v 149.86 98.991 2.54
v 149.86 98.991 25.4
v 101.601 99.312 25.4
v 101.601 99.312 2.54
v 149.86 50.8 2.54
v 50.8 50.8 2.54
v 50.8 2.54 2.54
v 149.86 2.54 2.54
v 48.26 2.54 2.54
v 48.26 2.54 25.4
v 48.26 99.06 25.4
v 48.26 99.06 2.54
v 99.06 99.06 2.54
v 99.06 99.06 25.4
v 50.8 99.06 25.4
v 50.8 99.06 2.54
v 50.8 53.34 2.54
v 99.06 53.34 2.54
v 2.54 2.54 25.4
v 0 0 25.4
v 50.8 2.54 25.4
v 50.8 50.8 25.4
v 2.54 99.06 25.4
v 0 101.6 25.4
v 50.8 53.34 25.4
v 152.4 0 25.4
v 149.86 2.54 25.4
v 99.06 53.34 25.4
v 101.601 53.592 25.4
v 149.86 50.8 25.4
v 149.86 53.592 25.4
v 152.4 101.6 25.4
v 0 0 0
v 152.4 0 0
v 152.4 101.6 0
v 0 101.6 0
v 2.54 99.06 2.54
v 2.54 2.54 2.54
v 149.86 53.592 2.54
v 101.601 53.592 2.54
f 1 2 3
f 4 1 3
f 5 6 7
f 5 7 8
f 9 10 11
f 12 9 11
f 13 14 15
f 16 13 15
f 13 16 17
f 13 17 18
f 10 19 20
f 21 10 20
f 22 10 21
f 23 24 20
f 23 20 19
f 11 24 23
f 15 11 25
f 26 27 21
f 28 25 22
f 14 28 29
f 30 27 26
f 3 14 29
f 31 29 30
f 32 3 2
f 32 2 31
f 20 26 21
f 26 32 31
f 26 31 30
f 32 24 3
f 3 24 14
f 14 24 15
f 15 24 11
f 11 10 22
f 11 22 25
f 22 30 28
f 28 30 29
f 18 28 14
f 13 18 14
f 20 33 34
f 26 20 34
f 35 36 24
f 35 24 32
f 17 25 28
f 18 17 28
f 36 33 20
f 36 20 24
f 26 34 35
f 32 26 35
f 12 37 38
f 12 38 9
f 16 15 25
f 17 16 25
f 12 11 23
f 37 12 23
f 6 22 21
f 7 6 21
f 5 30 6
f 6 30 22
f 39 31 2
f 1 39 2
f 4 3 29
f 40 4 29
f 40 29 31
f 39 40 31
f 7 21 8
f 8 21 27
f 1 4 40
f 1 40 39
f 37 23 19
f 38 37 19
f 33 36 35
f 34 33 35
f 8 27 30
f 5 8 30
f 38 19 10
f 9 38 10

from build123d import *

# Parameters (mm, degrees)
F0_W     = 152.4
F0_H     = 101.6
F1_DEPTH = 25.4
F3_DEPTH = 22.86
F5_DEPTH = 22.86
F7_DEPTH = 22.86
F9_DEPTH = 22.86


with BuildPart() as f1:
    # F0 (on Top) → F1 (new body)
    with BuildSketch(Plane.XY):
        with Locations((76.2, 50.8)):
            Rectangle(F0_W, F0_H)
    extrude(amount=F1_DEPTH)

    # F2 (on face) → F3 (cut)
    with BuildSketch(Plane.XY.offset(25.4)):
        Polygon((22.016909, 99.06), (2.54, 99.06), (2.54, 62.21069), (2.54, 2.54), (48.26, 2.54), (48.26, 99.06), align=None)
    extrude(amount=-F3_DEPTH, mode=Mode.SUBTRACT)

    # F4 (on face) → F5 (cut)
    with BuildSketch(Plane.XY.offset(25.4)):
        Polygon((67.743346, 99.06), (50.8, 99.06), (50.8, 76.2), (50.8, 53.34), (99.06, 53.34), (99.06, 99.06), align=None)
    extrude(amount=-F5_DEPTH, mode=Mode.SUBTRACT)

    # F6 (on face) → F7 (cut)
    with BuildSketch(Plane.XY.offset(25.4)):
        Polygon((74.93, 50.8), (50.8, 50.8), (50.8, 26.67), (50.8, 2.54), (149.86, 2.54), (149.86, 50.8), align=None)
    extrude(amount=-F7_DEPTH, mode=Mode.SUBTRACT)

    # F8 (on face) → F9 (cut)
    with BuildSketch(Plane.XY.offset(25.4)):
        Polygon((149.86, 98.991269), (101.601067, 99.31215), (101.601067, 53.59215), (149.86, 53.59215), align=None)
    extrude(amount=-F9_DEPTH, mode=Mode.SUBTRACT)


solid = f1.part
